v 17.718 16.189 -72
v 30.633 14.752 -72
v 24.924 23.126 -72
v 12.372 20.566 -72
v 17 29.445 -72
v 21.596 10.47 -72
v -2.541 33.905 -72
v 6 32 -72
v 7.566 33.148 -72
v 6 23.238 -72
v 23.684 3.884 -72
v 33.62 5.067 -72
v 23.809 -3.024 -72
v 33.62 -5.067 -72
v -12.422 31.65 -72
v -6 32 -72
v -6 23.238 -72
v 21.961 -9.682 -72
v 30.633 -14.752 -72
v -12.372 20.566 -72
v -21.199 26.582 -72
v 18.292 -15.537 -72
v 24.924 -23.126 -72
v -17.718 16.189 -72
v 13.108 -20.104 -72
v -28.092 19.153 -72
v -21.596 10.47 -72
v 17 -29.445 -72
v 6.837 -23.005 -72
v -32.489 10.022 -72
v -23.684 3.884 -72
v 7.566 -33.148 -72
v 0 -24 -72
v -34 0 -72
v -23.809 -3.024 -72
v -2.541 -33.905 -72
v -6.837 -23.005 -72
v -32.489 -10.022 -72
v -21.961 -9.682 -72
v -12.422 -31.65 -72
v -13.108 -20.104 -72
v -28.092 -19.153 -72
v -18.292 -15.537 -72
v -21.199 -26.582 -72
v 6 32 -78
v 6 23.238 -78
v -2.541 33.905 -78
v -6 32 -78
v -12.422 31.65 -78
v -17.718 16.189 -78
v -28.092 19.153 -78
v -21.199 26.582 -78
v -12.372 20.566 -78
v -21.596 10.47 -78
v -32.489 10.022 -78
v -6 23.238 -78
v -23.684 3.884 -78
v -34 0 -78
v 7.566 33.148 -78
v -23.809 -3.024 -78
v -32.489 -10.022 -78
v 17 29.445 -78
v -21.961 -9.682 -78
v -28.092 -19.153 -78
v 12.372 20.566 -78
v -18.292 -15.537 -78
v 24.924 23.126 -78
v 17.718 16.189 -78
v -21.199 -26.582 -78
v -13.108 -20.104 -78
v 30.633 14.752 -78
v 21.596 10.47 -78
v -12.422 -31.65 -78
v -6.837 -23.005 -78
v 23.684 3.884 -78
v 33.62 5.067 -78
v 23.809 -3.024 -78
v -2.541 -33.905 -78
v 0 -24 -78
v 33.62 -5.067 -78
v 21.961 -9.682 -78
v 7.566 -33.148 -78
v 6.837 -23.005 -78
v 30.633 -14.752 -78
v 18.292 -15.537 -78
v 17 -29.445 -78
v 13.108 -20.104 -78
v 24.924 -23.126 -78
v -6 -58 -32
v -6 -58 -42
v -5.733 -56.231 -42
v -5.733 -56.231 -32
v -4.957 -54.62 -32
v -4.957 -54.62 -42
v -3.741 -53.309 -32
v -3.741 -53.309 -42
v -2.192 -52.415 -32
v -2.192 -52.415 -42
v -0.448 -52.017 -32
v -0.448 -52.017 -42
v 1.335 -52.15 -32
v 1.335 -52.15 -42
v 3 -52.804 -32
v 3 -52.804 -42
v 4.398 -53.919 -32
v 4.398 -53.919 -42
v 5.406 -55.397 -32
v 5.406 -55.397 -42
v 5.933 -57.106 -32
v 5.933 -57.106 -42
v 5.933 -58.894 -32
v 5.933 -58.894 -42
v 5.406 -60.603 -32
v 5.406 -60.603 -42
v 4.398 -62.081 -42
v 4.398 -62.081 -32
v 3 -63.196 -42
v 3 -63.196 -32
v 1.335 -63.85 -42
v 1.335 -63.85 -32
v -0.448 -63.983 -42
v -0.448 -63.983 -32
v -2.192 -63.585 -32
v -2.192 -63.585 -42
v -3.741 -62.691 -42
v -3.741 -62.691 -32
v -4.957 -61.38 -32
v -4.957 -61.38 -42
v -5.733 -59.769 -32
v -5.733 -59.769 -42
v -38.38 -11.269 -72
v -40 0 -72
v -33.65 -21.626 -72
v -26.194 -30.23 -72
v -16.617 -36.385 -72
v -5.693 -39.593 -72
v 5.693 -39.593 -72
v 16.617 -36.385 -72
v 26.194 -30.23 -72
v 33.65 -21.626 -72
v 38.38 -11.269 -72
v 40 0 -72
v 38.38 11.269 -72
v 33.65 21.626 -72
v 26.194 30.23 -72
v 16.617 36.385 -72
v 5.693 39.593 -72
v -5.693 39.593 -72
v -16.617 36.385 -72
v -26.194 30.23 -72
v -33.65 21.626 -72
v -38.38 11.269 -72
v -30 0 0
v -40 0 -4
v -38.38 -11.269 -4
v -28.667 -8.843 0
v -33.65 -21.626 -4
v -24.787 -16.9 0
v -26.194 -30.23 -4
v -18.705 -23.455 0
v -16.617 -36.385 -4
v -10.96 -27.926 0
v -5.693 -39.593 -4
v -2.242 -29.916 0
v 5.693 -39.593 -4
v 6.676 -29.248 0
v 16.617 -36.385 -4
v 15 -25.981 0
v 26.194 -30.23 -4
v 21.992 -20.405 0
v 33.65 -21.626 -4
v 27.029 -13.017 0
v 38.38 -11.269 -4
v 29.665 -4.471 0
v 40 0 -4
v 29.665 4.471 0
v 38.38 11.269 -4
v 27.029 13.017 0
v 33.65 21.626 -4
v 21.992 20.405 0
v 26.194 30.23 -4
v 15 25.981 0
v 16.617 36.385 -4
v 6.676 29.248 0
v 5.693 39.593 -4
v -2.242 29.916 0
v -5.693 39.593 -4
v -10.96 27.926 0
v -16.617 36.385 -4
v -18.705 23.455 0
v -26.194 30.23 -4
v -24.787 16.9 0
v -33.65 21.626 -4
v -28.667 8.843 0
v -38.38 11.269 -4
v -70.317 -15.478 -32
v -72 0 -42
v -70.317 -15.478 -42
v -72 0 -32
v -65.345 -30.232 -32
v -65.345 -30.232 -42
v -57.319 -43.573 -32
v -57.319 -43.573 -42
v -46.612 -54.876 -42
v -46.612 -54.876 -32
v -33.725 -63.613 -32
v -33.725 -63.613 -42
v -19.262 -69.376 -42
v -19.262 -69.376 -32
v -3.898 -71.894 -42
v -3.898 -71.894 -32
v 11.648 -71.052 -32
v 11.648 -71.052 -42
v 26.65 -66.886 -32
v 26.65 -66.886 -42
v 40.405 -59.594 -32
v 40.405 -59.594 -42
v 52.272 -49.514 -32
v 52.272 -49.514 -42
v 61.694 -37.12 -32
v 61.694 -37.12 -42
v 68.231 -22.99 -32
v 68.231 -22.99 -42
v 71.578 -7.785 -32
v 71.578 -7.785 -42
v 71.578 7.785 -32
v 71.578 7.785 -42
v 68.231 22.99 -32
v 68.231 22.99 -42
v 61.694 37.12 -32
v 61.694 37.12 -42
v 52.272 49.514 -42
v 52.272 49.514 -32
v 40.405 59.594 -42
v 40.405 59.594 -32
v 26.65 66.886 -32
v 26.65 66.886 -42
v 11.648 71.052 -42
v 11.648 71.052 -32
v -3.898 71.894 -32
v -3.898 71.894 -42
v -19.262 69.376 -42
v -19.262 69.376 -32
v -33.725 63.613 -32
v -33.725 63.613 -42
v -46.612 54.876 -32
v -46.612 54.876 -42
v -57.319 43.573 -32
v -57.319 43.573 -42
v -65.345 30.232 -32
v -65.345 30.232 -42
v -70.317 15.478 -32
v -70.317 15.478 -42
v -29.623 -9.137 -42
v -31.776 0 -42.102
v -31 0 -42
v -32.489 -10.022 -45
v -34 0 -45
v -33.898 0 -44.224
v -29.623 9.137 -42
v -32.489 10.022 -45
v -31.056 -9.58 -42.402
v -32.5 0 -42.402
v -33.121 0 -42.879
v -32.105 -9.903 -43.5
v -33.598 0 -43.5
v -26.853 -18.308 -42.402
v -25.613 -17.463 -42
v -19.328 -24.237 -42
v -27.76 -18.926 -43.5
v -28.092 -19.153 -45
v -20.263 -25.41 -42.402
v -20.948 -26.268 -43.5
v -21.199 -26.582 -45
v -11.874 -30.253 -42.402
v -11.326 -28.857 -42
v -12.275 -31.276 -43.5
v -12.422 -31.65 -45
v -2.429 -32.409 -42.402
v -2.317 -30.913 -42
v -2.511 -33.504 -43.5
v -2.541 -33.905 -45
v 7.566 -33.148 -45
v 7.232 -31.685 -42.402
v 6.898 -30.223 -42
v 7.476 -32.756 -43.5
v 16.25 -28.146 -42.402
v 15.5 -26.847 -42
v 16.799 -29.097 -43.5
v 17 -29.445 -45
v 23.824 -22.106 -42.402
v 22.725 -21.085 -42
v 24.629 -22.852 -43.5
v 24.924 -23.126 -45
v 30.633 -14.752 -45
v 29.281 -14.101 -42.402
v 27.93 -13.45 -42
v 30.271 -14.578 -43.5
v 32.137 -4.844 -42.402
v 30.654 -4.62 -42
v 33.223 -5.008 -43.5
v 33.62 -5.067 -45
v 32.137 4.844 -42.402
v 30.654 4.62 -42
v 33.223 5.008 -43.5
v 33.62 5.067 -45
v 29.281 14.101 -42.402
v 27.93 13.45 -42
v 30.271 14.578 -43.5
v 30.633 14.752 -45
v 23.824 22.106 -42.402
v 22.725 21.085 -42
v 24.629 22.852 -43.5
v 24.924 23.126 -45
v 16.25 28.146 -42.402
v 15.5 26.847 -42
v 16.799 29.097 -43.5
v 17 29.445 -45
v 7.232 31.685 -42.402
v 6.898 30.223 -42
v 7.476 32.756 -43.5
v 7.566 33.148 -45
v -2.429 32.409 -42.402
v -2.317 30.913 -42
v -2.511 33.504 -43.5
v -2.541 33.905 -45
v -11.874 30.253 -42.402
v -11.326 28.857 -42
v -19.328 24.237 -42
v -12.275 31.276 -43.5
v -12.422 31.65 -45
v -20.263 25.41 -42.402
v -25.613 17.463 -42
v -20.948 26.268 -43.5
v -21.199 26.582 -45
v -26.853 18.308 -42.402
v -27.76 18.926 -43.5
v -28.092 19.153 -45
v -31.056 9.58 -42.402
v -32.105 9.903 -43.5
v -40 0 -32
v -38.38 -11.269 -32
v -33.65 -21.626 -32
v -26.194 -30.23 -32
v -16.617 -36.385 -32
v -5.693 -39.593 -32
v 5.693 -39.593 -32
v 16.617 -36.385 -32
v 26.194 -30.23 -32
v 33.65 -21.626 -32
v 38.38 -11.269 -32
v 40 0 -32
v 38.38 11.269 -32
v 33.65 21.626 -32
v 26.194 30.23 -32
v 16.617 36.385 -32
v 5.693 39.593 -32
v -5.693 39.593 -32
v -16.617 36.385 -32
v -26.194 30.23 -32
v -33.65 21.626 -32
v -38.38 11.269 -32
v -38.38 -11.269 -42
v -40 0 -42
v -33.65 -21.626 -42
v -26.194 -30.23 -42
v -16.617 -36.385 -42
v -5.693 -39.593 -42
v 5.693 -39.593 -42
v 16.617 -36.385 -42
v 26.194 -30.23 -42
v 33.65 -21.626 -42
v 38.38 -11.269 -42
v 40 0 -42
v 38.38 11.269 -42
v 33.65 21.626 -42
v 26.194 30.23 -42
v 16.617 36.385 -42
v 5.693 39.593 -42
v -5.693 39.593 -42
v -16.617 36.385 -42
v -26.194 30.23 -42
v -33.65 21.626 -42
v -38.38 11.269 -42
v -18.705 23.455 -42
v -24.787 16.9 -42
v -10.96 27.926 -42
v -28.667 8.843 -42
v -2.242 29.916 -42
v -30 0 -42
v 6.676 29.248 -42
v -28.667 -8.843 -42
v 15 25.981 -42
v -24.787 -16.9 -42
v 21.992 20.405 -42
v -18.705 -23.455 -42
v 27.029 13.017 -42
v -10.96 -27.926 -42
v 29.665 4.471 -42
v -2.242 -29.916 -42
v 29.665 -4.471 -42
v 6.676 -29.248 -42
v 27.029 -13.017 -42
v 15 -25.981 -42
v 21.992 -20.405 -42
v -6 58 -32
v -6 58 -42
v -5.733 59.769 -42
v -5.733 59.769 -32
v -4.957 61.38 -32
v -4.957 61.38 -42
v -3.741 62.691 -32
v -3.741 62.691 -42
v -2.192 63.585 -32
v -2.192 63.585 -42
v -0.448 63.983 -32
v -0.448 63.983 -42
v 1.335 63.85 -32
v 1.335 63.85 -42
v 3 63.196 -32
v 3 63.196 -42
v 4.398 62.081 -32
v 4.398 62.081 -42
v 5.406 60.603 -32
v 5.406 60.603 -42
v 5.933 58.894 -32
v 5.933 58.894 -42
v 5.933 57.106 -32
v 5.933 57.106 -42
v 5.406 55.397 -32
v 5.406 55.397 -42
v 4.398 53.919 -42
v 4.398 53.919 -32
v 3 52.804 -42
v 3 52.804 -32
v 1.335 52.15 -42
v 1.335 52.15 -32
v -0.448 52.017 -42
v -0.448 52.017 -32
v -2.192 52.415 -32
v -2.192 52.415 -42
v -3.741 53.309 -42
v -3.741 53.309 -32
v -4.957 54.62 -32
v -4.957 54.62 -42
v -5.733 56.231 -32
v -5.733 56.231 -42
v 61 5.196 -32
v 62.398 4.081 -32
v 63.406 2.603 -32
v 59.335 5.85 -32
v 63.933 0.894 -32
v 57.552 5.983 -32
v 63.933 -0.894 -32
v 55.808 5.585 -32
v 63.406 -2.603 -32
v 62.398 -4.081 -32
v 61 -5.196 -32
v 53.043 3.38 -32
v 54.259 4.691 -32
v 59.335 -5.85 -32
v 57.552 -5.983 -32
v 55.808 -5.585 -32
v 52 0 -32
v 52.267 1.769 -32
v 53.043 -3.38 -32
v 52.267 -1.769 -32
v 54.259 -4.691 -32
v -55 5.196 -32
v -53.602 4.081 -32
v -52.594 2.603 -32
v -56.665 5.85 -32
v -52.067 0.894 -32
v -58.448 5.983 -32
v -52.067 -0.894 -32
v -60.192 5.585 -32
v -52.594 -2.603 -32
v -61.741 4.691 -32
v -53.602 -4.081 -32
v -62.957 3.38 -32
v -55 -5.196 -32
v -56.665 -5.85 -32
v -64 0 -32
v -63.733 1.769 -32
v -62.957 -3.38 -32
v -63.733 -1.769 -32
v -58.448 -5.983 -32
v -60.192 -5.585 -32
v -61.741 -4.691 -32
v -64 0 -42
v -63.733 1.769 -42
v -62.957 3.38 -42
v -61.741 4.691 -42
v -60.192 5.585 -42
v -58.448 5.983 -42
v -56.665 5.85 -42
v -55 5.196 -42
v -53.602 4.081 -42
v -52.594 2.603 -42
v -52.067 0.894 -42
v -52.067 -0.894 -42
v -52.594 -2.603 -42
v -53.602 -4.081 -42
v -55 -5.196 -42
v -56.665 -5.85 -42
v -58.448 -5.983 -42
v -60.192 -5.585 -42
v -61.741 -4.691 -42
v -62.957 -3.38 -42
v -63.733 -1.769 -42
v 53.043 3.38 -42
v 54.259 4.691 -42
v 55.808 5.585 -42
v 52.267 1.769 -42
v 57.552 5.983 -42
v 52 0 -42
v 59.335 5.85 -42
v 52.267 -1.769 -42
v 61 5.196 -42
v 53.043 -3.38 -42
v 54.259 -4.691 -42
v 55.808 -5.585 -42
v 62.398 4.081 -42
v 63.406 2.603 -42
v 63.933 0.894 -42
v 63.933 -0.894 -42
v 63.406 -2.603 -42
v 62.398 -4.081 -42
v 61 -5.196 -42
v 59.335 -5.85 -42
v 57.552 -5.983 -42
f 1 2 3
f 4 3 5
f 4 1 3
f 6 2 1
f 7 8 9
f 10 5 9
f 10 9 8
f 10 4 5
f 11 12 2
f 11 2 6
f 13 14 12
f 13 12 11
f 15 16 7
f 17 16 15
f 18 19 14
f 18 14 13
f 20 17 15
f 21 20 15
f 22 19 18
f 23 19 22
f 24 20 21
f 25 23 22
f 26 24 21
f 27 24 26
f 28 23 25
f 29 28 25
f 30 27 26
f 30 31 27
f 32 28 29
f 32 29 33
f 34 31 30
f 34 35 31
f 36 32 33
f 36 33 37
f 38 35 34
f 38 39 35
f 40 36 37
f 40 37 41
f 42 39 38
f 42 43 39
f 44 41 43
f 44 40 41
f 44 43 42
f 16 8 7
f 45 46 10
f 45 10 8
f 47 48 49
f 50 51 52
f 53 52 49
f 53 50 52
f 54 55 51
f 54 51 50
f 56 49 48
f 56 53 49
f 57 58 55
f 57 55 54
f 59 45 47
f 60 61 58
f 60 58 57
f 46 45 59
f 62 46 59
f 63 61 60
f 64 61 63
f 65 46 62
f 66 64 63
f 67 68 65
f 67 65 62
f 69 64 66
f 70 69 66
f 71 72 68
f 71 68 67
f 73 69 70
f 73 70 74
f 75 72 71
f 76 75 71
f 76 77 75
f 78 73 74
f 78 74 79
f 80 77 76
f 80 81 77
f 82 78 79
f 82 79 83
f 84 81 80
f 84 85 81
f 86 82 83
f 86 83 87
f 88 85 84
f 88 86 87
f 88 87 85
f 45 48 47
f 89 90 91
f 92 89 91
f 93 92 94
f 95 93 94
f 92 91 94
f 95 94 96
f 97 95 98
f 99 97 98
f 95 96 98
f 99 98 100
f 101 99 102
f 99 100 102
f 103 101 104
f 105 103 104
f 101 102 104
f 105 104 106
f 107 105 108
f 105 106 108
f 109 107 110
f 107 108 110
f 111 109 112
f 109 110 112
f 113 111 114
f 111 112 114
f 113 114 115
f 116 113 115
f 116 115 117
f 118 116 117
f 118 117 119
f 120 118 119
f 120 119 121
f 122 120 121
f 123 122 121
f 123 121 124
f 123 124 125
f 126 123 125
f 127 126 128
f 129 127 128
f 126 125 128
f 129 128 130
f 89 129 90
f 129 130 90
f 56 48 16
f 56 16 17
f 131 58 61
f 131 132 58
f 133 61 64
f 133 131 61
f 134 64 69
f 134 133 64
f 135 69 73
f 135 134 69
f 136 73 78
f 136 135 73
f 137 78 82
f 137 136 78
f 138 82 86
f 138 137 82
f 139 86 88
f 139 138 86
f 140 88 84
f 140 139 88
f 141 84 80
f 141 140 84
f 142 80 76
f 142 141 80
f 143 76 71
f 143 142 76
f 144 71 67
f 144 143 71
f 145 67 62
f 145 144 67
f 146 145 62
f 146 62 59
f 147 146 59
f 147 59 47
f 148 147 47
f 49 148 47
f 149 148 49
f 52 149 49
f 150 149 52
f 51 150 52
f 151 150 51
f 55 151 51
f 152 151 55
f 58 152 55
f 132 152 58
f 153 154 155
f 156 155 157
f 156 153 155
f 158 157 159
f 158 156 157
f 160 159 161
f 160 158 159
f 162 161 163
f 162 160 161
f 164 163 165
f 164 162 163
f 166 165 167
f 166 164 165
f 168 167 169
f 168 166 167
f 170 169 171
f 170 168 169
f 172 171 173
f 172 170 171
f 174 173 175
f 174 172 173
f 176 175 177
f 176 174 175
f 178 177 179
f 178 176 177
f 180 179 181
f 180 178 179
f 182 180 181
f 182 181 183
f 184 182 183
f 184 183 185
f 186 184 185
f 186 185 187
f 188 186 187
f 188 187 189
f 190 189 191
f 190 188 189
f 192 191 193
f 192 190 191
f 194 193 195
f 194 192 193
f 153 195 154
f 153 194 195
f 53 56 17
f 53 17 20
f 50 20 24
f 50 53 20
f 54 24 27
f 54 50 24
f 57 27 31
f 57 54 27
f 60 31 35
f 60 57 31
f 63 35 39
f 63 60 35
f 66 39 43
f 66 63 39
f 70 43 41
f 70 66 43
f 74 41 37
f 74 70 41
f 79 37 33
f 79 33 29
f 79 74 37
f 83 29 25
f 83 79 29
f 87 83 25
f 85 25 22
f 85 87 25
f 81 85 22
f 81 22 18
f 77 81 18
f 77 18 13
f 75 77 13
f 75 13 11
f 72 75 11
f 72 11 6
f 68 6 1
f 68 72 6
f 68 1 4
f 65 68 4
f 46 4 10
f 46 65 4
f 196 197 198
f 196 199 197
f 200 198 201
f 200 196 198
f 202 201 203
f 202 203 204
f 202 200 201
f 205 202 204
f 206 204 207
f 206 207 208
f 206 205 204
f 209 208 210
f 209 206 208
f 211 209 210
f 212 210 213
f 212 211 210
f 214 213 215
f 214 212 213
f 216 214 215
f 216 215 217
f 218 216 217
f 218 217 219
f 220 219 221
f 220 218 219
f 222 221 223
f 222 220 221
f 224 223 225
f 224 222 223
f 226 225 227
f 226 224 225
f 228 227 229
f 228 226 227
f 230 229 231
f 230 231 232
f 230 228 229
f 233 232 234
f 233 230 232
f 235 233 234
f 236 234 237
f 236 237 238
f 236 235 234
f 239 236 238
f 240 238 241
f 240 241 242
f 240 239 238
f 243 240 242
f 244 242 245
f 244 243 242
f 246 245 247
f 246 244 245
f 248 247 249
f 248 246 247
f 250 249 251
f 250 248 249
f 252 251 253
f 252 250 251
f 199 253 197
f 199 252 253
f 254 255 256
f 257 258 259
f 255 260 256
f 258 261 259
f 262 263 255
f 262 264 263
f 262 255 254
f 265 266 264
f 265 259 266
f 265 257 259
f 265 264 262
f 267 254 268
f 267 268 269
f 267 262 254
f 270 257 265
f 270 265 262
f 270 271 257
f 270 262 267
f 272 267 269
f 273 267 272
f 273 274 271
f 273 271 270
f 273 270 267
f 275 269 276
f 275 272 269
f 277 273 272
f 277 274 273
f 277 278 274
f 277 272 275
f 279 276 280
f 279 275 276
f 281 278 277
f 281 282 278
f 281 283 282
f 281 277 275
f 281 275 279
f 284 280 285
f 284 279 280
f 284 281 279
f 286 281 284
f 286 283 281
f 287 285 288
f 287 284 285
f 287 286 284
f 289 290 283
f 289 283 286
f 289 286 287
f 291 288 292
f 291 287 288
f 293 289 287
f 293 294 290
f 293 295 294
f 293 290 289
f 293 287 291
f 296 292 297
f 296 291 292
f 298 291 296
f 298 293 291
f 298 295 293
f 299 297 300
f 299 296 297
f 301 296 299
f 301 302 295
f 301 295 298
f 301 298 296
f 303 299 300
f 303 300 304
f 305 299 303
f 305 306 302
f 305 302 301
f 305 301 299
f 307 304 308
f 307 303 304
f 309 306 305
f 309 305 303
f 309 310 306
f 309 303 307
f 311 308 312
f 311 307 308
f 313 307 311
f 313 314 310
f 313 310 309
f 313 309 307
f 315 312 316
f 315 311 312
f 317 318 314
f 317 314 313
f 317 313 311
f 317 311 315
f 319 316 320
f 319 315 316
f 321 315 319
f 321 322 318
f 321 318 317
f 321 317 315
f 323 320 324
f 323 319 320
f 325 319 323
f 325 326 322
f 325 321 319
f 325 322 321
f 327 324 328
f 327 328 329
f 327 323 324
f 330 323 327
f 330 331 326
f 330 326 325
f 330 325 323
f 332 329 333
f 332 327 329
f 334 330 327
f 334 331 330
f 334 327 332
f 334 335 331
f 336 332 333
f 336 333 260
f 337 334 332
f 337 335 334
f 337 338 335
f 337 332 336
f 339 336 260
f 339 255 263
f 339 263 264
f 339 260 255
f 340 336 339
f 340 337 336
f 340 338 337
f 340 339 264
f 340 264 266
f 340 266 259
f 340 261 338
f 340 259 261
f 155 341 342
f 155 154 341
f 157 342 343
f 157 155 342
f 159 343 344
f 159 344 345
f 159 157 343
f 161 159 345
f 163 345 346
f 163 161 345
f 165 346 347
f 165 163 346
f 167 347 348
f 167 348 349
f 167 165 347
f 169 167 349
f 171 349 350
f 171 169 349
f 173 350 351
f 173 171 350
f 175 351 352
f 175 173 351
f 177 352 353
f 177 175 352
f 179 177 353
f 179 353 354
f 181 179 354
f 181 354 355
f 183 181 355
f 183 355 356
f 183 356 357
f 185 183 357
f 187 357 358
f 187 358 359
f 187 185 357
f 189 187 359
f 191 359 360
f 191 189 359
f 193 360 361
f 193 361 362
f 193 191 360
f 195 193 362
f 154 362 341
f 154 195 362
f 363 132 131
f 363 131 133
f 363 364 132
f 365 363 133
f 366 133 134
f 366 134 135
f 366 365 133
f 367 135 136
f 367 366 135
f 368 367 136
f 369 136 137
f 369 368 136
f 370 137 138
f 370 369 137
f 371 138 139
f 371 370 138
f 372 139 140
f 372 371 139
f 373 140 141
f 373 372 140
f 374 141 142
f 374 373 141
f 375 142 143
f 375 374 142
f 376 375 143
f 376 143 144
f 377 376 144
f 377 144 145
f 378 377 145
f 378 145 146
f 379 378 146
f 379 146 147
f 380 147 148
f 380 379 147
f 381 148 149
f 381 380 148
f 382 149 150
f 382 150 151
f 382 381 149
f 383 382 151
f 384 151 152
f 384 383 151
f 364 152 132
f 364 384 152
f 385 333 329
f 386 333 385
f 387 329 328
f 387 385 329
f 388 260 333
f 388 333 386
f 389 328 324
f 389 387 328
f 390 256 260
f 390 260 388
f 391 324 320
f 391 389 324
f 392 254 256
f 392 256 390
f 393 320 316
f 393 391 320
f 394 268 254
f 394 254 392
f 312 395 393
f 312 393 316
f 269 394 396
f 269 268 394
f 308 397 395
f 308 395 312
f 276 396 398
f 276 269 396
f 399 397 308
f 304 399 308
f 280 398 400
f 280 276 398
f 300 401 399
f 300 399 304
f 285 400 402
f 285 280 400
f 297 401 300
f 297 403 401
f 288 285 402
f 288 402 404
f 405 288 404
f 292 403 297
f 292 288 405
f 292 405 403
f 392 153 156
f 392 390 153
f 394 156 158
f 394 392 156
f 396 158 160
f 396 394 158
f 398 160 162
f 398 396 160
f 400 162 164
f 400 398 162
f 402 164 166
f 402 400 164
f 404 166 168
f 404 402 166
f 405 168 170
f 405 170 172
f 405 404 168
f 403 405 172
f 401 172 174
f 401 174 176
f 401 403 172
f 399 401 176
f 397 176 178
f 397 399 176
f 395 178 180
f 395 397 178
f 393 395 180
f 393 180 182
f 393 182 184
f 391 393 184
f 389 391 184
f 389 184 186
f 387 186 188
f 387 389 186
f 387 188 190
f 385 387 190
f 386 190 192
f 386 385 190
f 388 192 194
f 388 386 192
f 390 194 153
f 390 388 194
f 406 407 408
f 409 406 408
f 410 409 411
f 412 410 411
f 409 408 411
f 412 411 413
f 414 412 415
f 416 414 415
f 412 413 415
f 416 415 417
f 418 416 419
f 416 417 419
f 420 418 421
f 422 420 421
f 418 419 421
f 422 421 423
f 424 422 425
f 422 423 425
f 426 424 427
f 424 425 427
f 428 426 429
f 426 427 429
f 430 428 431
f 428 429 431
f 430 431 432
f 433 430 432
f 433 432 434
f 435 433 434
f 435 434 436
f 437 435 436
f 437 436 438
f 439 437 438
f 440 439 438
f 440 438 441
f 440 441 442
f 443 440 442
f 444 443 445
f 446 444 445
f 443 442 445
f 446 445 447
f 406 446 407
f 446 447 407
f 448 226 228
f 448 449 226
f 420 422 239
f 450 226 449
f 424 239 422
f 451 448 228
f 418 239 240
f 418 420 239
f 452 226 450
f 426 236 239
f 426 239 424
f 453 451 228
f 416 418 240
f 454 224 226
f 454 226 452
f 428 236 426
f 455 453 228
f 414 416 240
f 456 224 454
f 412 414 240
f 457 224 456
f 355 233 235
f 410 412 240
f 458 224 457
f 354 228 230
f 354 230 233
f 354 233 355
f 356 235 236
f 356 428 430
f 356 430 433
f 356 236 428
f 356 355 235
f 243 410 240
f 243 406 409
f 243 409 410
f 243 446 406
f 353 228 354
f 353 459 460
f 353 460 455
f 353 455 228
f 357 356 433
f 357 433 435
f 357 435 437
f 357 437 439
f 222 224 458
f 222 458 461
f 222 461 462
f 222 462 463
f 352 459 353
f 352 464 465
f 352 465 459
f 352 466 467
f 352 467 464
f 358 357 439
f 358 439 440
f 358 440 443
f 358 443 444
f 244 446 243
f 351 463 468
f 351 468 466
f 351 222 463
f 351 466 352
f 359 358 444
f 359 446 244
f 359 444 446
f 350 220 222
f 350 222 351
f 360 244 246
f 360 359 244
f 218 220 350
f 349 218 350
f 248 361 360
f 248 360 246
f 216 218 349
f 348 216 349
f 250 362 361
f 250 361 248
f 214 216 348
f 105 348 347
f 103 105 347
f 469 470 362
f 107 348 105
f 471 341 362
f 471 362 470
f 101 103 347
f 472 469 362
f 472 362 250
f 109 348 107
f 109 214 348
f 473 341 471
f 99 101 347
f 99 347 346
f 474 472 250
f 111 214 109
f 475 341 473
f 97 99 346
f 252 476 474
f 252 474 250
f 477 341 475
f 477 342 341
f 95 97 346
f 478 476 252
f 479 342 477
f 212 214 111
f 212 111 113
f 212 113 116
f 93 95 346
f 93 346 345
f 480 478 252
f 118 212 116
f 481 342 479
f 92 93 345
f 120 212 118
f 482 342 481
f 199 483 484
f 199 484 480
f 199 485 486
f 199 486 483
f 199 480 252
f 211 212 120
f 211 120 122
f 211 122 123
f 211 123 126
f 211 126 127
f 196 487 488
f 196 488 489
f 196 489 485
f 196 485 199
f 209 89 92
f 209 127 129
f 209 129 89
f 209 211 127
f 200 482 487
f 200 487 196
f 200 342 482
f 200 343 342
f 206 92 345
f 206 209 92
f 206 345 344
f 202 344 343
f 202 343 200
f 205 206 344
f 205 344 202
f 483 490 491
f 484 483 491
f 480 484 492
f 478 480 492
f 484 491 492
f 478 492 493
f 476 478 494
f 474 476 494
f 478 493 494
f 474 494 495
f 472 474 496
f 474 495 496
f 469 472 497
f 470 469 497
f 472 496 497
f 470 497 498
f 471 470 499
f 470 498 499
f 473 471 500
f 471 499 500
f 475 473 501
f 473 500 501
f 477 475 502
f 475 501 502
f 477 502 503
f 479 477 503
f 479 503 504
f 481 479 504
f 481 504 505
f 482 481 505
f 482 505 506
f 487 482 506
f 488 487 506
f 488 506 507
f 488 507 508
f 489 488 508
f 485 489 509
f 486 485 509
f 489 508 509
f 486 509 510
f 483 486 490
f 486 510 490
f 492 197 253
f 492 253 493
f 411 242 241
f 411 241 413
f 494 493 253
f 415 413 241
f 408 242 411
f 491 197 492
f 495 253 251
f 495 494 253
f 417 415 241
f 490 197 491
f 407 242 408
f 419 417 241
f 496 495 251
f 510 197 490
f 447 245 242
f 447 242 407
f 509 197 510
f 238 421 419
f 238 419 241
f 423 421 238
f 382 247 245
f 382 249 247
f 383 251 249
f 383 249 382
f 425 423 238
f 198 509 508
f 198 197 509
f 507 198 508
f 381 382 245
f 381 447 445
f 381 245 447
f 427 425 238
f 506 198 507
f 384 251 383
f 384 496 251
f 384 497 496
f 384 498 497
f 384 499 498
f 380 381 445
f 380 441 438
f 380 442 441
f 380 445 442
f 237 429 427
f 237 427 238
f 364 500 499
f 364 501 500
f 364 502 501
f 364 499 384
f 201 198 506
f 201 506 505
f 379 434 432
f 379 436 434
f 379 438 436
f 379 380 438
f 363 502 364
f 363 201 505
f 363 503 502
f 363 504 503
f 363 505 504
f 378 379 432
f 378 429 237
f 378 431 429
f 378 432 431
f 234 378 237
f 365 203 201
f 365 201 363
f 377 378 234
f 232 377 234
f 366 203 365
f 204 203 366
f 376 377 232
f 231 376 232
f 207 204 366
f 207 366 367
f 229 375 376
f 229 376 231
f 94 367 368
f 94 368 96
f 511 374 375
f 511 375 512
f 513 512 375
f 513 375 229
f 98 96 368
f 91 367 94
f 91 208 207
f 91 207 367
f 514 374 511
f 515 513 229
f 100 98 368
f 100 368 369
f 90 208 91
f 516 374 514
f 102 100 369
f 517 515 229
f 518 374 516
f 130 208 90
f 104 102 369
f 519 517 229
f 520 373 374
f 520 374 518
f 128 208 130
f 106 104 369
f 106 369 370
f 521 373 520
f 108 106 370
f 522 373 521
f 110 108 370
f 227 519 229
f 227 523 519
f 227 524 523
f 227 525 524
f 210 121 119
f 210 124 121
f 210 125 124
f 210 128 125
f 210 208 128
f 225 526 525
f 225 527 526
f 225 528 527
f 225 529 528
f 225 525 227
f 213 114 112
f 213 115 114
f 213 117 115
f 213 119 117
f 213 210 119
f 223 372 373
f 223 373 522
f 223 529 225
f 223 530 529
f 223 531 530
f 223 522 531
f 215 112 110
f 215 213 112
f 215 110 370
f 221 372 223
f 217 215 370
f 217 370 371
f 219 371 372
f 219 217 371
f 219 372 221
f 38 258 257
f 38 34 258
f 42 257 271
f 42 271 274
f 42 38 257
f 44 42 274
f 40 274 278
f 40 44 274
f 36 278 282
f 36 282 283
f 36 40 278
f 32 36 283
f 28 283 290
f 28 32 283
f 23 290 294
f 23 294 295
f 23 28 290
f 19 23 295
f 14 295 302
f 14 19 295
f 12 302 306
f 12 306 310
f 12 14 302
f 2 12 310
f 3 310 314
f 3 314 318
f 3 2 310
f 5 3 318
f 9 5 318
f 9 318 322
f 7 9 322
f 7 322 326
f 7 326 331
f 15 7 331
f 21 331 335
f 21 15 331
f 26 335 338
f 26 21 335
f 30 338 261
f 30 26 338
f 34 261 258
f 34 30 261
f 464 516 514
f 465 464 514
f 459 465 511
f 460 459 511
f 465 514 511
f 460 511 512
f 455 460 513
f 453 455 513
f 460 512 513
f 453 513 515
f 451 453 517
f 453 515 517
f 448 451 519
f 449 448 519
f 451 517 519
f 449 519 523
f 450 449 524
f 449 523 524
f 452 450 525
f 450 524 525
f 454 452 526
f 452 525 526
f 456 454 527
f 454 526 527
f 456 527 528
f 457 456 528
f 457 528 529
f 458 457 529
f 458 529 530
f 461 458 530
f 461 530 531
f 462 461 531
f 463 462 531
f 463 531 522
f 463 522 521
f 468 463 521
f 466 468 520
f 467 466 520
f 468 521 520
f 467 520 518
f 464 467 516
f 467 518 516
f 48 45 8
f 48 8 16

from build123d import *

# Parameters (mm, degrees)
SKETCH2_R          = 6
CUT_EXTRUDE1_DEPTH = 10
CUT_EXTRUDE2_DEPTH = 6


with BuildPart() as part:
    # Sketch1 → Revolve2 (revolve)
    with BuildSketch(Plane(origin=(0, 0, 0), x_dir=(1, 0, 0), z_dir=(0, 1, 0)), mode=Mode.PRIVATE) as revolve2_sk:
        with BuildLine():
            ThreePointArc((31, 42), (33.121320344, 42.878679656), (34, 45))
            Line((34, 45), (34, 72))
            Line((34, 72), (0, 72))
            Line((0, 72), (0, 78))
            Line((0, 78), (34, 78))
            Line((34, 78), (40, 72))
            Line((40, 72), (40, 42))
            Line((40, 42), (72, 42))
            Line((72, 42), (72, 32))
            Line((72, 32), (40, 32))
            Line((40, 32), (40, 4))
            Line((40, 4), (30, 0))
            Line((30, 0), (30, 42))
            Line((30, 42), (31, 42))
        make_face()
    revolve(revolve2_sk.sketch.rotate(Axis((0, 0, -115.849307743), (0, 0, 1)), 180), axis=Axis((0, 0, -115.849307743), (0, 0, 1)))

    # Sketch2 → Cut-Extrude1 (cut)
    with BuildSketch(Plane(origin=(0, 0, -42), x_dir=(-1, 0, 0), z_dir=(0, 0, -1))):
        with Locations((58, 0)):
            Circle(SKETCH2_R)
        with Locations((0, -58)):
            Circle(SKETCH2_R)
        with Locations((-58, 0)):
            Circle(SKETCH2_R)
        with Locations((0, 58)):
            Circle(SKETCH2_R)
    extrude(amount=-CUT_EXTRUDE1_DEPTH, mode=Mode.SUBTRACT)

    # Sketch3 → Cut-Extrude2 (cut)
    with BuildSketch(Plane(origin=(0, 0, -78), x_dir=(-1, 0, 0), z_dir=(0, 0, -1))):
        with BuildLine():
            Line((-6, 32), (6, 32))
            Line((6, 32), (6, 23.237900077))
            ThreePointArc((6, 23.237900077), (0, -24), (-6, 23.237900077))
            Line((-6, 23.237900077), (-6, 32))
        make_face()
    extrude(amount=-CUT_EXTRUDE2_DEPTH, mode=Mode.SUBTRACT)


solid = part.part
